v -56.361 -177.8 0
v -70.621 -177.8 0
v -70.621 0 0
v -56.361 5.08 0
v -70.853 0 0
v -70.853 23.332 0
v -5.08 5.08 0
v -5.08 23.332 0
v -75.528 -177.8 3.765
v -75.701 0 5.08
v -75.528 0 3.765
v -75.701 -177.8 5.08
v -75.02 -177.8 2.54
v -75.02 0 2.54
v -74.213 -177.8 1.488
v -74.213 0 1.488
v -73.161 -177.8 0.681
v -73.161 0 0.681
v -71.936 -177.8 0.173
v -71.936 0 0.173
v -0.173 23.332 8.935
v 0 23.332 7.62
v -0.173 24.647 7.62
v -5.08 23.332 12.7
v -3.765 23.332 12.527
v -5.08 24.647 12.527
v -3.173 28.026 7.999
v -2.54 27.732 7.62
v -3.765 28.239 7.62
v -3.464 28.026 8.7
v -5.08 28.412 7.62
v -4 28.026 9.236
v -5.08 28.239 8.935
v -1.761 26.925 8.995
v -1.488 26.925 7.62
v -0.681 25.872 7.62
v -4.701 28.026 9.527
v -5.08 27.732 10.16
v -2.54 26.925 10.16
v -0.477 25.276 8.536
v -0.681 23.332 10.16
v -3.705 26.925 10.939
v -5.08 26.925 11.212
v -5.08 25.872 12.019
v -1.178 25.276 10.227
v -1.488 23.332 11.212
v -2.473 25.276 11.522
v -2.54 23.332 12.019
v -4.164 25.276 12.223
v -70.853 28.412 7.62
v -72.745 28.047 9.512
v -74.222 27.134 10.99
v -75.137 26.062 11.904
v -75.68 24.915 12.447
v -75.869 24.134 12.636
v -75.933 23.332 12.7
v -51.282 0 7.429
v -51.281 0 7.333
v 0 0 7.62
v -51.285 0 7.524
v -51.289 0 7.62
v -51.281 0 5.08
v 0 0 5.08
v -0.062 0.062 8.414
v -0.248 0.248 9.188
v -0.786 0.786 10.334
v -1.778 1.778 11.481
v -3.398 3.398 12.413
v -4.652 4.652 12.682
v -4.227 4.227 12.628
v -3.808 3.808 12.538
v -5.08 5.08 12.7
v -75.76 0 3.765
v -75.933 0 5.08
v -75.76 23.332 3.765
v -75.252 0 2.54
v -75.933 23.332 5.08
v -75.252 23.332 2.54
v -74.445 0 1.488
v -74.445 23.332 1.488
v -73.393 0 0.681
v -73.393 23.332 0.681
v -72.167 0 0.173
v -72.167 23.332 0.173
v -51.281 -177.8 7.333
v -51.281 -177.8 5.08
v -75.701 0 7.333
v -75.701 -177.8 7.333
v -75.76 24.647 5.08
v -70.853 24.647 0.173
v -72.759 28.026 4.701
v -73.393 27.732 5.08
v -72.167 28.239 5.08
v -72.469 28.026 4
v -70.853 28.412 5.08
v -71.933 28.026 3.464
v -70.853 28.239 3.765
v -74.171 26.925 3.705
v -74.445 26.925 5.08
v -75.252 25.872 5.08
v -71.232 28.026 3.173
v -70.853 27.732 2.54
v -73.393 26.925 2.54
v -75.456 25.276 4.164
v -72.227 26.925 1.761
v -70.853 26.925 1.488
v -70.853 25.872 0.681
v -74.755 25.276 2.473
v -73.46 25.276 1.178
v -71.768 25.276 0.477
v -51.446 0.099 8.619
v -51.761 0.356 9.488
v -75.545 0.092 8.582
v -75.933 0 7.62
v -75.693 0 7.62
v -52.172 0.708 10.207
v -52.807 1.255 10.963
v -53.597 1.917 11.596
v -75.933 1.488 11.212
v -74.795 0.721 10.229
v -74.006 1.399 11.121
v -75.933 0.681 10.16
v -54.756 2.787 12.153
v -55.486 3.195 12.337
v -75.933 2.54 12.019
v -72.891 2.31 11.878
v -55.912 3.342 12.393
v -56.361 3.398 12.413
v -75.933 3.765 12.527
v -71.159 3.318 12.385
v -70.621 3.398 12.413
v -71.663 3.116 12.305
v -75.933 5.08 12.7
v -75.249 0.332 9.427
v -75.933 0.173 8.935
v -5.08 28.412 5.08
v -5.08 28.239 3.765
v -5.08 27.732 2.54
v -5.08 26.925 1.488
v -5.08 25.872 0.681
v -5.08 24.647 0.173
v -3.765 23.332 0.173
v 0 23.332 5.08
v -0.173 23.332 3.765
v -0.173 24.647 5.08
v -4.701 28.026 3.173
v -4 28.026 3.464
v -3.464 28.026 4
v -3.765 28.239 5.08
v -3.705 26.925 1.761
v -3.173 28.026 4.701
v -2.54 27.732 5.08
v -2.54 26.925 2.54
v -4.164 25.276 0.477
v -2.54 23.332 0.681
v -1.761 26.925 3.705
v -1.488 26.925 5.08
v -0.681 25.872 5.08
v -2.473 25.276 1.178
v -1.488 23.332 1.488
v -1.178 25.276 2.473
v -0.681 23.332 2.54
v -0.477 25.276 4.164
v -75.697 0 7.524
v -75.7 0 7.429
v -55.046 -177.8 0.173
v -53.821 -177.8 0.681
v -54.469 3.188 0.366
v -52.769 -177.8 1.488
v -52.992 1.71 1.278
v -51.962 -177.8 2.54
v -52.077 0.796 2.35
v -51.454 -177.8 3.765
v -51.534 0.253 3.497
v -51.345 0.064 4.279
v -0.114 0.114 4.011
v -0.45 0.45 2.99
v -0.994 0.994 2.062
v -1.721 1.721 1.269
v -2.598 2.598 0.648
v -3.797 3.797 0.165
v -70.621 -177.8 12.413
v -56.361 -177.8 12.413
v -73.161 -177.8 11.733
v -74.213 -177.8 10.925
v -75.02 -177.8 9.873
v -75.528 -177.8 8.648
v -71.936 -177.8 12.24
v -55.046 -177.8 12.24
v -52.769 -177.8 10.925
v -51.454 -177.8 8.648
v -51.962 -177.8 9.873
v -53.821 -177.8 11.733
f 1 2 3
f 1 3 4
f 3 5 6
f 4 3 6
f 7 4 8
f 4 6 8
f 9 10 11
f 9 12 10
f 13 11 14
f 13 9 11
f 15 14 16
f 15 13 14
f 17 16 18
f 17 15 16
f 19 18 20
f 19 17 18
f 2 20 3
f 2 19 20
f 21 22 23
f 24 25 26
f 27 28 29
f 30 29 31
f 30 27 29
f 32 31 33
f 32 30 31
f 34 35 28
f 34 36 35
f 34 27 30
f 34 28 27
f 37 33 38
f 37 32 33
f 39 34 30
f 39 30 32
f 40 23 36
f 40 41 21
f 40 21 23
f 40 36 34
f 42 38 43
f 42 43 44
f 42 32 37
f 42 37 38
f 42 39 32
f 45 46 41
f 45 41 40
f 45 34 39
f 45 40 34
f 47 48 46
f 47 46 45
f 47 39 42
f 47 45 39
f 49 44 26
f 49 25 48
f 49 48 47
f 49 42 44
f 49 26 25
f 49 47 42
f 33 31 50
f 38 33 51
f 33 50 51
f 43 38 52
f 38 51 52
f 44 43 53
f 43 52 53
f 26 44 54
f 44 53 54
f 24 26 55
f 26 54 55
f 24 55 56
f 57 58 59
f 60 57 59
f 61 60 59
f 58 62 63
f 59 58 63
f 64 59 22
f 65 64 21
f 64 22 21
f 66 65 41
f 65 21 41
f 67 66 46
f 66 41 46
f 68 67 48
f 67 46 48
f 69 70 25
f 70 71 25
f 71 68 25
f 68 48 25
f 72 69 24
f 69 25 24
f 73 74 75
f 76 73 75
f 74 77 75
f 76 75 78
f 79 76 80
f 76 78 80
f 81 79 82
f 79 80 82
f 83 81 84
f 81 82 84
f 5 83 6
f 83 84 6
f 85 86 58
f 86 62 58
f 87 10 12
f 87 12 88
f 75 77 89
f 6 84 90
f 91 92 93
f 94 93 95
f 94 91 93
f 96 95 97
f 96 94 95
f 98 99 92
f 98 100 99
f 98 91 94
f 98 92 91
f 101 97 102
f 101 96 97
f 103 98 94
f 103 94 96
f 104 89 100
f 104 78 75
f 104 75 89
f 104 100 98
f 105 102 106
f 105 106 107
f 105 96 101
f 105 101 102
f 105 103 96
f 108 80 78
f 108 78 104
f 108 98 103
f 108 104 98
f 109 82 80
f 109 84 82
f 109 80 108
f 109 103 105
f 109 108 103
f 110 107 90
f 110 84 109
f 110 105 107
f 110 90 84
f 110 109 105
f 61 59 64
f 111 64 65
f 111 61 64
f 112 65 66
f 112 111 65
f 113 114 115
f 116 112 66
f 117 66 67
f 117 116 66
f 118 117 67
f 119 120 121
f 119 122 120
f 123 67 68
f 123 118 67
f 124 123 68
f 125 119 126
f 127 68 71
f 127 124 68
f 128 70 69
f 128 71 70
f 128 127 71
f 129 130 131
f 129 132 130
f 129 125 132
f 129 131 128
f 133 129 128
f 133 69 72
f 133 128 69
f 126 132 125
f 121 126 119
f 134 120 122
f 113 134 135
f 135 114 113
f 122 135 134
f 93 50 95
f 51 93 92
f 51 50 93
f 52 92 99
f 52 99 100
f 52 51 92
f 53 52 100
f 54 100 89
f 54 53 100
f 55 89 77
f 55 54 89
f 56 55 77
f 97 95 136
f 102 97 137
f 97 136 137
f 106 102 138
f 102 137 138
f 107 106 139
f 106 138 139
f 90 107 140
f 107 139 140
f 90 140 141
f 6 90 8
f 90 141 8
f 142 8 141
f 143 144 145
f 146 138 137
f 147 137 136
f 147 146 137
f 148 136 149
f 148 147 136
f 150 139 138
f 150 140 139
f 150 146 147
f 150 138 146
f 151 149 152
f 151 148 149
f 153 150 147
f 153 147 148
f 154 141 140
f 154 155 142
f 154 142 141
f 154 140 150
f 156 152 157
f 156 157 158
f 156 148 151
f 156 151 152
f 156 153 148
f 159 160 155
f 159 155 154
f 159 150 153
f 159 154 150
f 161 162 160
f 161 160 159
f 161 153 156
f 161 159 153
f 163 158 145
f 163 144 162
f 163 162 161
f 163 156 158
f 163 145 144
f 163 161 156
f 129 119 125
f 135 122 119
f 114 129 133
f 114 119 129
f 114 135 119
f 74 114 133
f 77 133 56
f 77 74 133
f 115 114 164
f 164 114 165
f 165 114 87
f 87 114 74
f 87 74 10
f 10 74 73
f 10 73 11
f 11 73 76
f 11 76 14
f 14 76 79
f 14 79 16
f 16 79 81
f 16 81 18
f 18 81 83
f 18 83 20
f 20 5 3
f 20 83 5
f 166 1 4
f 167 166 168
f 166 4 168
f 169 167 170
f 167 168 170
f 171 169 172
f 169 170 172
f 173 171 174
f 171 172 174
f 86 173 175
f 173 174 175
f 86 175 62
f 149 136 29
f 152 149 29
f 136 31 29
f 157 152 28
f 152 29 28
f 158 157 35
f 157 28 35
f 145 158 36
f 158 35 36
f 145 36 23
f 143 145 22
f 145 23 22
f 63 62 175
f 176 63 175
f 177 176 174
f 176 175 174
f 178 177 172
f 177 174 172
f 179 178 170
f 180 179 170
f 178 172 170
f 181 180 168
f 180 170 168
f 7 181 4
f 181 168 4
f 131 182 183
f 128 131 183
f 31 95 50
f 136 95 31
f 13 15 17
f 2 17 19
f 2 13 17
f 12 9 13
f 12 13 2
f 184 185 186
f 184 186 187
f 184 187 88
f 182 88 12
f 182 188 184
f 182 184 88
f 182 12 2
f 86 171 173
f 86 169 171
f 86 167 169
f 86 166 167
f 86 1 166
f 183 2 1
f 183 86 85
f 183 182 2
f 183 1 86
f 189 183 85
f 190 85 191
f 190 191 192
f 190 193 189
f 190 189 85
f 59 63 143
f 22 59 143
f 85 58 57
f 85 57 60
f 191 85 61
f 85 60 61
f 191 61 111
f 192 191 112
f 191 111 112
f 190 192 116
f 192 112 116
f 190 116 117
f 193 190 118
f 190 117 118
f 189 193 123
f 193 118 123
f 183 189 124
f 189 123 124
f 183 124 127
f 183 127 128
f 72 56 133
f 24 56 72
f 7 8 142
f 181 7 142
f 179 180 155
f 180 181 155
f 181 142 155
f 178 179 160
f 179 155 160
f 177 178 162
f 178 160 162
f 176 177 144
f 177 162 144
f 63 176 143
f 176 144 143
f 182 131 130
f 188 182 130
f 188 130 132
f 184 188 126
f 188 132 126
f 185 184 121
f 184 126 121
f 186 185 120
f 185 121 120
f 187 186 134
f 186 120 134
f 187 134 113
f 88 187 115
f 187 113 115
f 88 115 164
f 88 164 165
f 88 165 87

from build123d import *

# Parameters (mm, degrees)
F0_W         = 75.9326070547
F0_H         = 28.4124165773
F1_DEPTH     = 12.7
F2_W         = 24.4196355343
F2_H         = 12.4133229256
F3_DEPTH     = 177.8
F4_T1_DEPTH  = 53.8124165773
F4_T3_DEPTH  = 63.9811988592
F4_T5_DEPTH  = 190.5
F4_T10_DEPTH = 101.3326070547
F4_T16_DEPTH = 101.3326070547
F4_T22_DEPTH = 101.3326070547
F4_T29_DEPTH = 101.3326070547
F4_T35_DEPTH = 101.3326070547
F4_T42_DEPTH = 76.6811988592
F4_T46_DEPTH = 203.2
F5_R         = 5.08
F6_R         = 5.08


# Not quite as in the source:
# - a fillet or chamfer that OpenCascade refuses, or shapes differently, is made with other operations: its cross-section is extruded or revolved along the edge and cut away or added


with BuildPart() as f1:
    # F0 (on Top) → F1 (new body)
    with BuildSketch(Plane.XY):
        with Locations((-37.9663035274, 14.2062082887)):
            Rectangle(F0_W, F0_H)
    extrude(amount=F1_DEPTH)

    # F2 (on Front) → F3 (join)
    with BuildSketch(Plane.XZ):
        with Locations((-63.4910166264, 6.2066614628)):
            Rectangle(F2_W, F2_H)
    extrude(amount=F3_DEPTH)

    # F4: fillet of radius 5.08 on 5 edges, made by hand

    # F4_s2 → F4_t1 (cut)
    with BuildSketch(Plane.XZ.offset(-41.1124165773)):
        with BuildLine():
            ThreePointArc((-5.08, 0), (-1.4878975516, 1.4878975516), (0, 5.08))
            Line((0, 5.08), (0, 0))
            Line((0, 0), (-5.08, 0))
        make_face()
        with BuildLine():
            ThreePointArc((0, 7.62), (-1.4878975516, 11.2121024484), (-5.08, 12.7))
            Line((-5.08, 12.7), (0, 12.7))
            Line((0, 12.7), (0, 7.62))
        make_face()
    extrude(amount=F4_T1_DEPTH, mode=Mode.SUBTRACT)

    # F4_s4 → F4_t3 (cut)
    with BuildSketch(Plane.YZ.offset(-51.2811988592)):
        with BuildLine():
            ThreePointArc((0, 5.08), (1.4878975516, 1.4878975516), (5.08, 0))
            Line((5.08, 0), (0, 0))
            Line((0, 0), (0, 5.08))
        make_face()
    extrude(amount=F4_T3_DEPTH, mode=Mode.SUBTRACT)

    # F4_s6 → F4_t5 (cut)
    with BuildSketch(Plane.XZ):
        with BuildLine():
            ThreePointArc((-56.3611988592, 0), (-52.7690964108, 1.4878975516), (-51.2811988592, 5.08))
            Line((-51.2811988592, 5.08), (-51.2811988592, 0))
            Line((-51.2811988592, 0), (-56.3611988592, 0))
        make_face()
    extrude(amount=F4_T5_DEPTH, mode=Mode.SUBTRACT)


with BuildPart() as f4_tool8:
    # F4_s9 → F4_t10 (new body)
    with BuildSketch(Plane.YZ.offset(-88.6326070547)):
        with BuildLine():
            ThreePointArc((0, 7.62), (1.4878975516, 11.2121024484), (5.08, 12.7))
            Line((5.08, 12.7), (0, 12.7))
            Line((0, 12.7), (0, 7.62))
        make_face()
    extrude(amount=F4_T10_DEPTH)

    split(bisect_by=Plane.YZ.offset(-75.7008343935), keep=Keep.BOTTOM)

    split(bisect_by=Plane.XY.offset(12.4133229256), keep=Keep.BOTTOM)


with BuildPart() as f1_1:
    add(f1.part)

    # F4_t7: cut F4_tool8
    add(f4_tool8.part, mode=Mode.SUBTRACT)


with BuildPart() as f4_tool14:
    # F4_s15 → F4_t16 (new body)
    with BuildSketch(Plane.YZ.offset(-88.6326070547)):
        with BuildLine():
            ThreePointArc((0, 7.62), (1.4878975516, 11.2121024484), (5.08, 12.7))
            Line((5.08, 12.7), (0, 12.7))
            Line((0, 12.7), (0, 7.62))
        make_face()
    extrude(amount=F4_T16_DEPTH)

    split(bisect_by=Plane.YZ.offset(-75.7008343935), keep=Keep.BOTTOM)

    split(bisect_by=Plane.XY.offset(12.4133229256), keep=Keep.TOP)


with BuildPart() as f1_2:
    add(f1_1.part)

    # F4_t13: cut F4_tool14
    add(f4_tool14.part, mode=Mode.SUBTRACT)


with BuildPart() as f4_tool20:
    # F4_s21 → F4_t22 (new body)
    with BuildSketch(Plane.YZ.offset(-88.6326070547)):
        with BuildLine():
            ThreePointArc((0, 7.62), (1.4878975516, 11.2121024484), (5.08, 12.7))
            Line((5.08, 12.7), (0, 12.7))
            Line((0, 12.7), (0, 7.62))
        make_face()
    extrude(amount=F4_T22_DEPTH)

    split(bisect_by=Plane.YZ.offset(-75.7008343935), keep=Keep.TOP)

    split(bisect_by=Plane.XY.offset(12.4133229256), keep=Keep.TOP)

    split(bisect_by=Plane.YZ.offset(-51.2811988592), keep=Keep.BOTTOM)


with BuildPart() as f1_3:
    add(f1_2.part)

    # F4_t19: cut F4_tool20
    add(f4_tool20.part, mode=Mode.SUBTRACT)


with BuildPart() as f4_tool27:
    # F4_s28 → F4_t29 (new body)
    with BuildSketch(Plane.YZ.offset(-88.6326070547)):
        with BuildLine():
            ThreePointArc((0, 7.62), (1.4878975516, 11.2121024484), (5.08, 12.7))
            Line((5.08, 12.7), (0, 12.7))
            Line((0, 12.7), (0, 7.62))
        make_face()
    extrude(amount=F4_T29_DEPTH)

    split(bisect_by=Plane.XY.offset(12.4133229256), keep=Keep.BOTTOM)

    split(bisect_by=Plane.YZ.offset(-51.2811988592), keep=Keep.TOP)


with BuildPart() as f1_4:
    add(f1_3.part)

    # F4_t26: cut F4_tool27
    add(f4_tool27.part, mode=Mode.SUBTRACT)


with BuildPart() as f4_tool33:
    # F4_s34 → F4_t35 (new body)
    with BuildSketch(Plane.YZ.offset(-88.6326070547)):
        with BuildLine():
            ThreePointArc((0, 7.62), (1.4878975516, 11.2121024484), (5.08, 12.7))
            Line((5.08, 12.7), (0, 12.7))
            Line((0, 12.7), (0, 7.62))
        make_face()
    extrude(amount=F4_T35_DEPTH)

    split(bisect_by=Plane.XY.offset(12.4133229256), keep=Keep.TOP)

    split(bisect_by=Plane.YZ.offset(-51.2811988592), keep=Keep.TOP)


with BuildPart() as f1_5:
    add(f1_4.part)

    # F4_t32: cut F4_tool33
    add(f4_tool33.part, mode=Mode.SUBTRACT)


with BuildPart() as f4_tool40:
    # F4_s41 → F4_t42 (new body)
    with BuildSketch(Plane.YZ.offset(-63.9811988592)):
        with BuildLine():
            ThreePointArc((0, 5.08), (1.4878975516, 1.4878975516), (5.08, 0))
            Line((5.08, 0), (0, 0))
            Line((0, 0), (0, 5.08))
        make_face()
    extrude(amount=F4_T42_DEPTH)

    split(bisect_by=Plane.YZ.offset(-51.2811988592), keep=Keep.BOTTOM)


with BuildPart() as f4_tool44:
    # F4_s45 → F4_t46 (new body)
    with BuildSketch(Plane.XZ.offset(-12.7)):
        with BuildLine():
            ThreePointArc((-56.3611988592, 0), (-52.7690964108, 1.4878975516), (-51.2811988592, 5.08))
            Line((-51.2811988592, 5.08), (-51.2811988592, 0))
            Line((-51.2811988592, 0), (-56.3611988592, 0))
        make_face()
    extrude(amount=F4_T46_DEPTH)

    split(bisect_by=Plane.XZ, keep=Keep.BOTTOM)


with BuildPart() as f4_tool40_1:
    add(f4_tool40.part)

    # F4_t48: intersect F4_tool44
    add(f4_tool44.part, mode=Mode.INTERSECT)


with BuildPart() as f1_6:
    add(f1_5.part)

    # F4_t38: cut F4_tool40
    add(f4_tool40_1.part, mode=Mode.SUBTRACT)

    # F5
    f5_edges = [f1_6.edges().sort_by_distance(p)[0] for p in [
        (-51.281199, -87.201198, 12.413323),
        (-75.700834, -87.201198, 12.413323),
        (-75.700834, -88.9, 0),
    ]]
    fillet(f5_edges, radius=F5_R)

    # F6
    f6_edges = [f1_6.edges().sort_by_distance(p)[0] for p in [
        (-75.932607, 14.206208, 0),
        (-75.932607, 28.412417, 6.35),
        (-40.506304, 28.412417, 0),
    ]]
    fillet(f6_edges, radius=F6_R)


solid = f1_6.part
